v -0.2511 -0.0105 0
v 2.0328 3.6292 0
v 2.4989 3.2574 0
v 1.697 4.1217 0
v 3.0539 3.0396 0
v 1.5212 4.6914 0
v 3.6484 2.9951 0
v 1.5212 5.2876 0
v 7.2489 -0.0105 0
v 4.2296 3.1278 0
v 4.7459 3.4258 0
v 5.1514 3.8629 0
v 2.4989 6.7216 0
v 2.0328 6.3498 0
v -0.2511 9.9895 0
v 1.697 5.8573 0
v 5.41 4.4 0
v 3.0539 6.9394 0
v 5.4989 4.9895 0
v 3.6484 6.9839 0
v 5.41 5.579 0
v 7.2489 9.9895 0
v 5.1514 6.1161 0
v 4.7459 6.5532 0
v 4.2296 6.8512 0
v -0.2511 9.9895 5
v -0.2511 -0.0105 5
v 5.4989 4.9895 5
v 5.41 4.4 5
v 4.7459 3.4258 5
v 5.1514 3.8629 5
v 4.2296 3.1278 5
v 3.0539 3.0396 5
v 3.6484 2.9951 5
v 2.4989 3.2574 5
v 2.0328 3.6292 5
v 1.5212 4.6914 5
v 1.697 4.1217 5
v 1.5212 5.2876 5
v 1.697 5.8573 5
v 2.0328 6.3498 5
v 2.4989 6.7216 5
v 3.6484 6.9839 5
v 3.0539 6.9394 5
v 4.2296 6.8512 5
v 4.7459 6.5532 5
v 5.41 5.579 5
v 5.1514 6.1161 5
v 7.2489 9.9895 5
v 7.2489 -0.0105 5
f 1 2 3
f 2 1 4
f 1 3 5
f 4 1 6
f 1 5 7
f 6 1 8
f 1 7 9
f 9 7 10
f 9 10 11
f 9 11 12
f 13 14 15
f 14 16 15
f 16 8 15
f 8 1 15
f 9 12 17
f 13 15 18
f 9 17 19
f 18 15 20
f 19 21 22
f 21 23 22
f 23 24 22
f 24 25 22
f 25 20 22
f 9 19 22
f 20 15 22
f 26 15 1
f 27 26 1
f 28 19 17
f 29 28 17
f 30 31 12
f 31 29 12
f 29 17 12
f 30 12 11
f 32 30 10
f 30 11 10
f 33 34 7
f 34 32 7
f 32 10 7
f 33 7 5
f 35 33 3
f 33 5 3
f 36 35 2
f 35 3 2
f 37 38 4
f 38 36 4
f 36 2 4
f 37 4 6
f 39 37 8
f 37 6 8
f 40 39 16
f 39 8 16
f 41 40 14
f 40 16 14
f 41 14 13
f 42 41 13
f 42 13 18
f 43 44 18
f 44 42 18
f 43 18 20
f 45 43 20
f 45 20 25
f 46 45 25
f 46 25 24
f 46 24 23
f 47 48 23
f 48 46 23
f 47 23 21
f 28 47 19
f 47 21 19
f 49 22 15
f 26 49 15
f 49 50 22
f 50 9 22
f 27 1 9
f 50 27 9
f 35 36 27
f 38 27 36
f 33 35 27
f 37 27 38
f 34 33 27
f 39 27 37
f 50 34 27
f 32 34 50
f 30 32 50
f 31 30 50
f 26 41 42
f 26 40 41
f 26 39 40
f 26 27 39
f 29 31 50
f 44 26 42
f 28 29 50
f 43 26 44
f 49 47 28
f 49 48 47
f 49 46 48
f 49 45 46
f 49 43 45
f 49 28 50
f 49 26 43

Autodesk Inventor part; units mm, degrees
ref_plane "YZ Plane" through (0, 0, 0) normal (1, 0, 0) x (0, 1, 0)
ref_plane "XZ Plane" through (0, 0, 0) normal (0, 1, 0) x (-1, 0, 0)
ref_plane "XY Plane" through (0, 0, 0) normal (0, 0, 1) x (1, 0, 0)
sketch "Sketch1" plane through (0, 0, 0) normal (0, 0, 1) x (1, 0, 0)
  line L0 (-0.2511, -0.0105) -> (7.2489, -0.0105)
  line L1 (7.2489, -0.0105) -> (7.2489, 9.9895)
  line L2 (7.2489, 9.9895) -> (-0.2511, 9.9895)
  line L3 (-0.2511, 9.9895) -> (-0.2511, -0.0105)
  circle A0 centre (3.4989, 4.9895) radius 2
  point P0 (7.2471, -0.0105)
  dimension "d2" = 4
  dimension "d3" = 5
  dimension "d4" = 7.5
  dimension "d5" = 10
  dimension "d6" = 3.75
extrude "Extrusion1" add sketch "Sketch1" along normal blind 5
properties part number "short back plate spacer" material "ABS Plastic"
